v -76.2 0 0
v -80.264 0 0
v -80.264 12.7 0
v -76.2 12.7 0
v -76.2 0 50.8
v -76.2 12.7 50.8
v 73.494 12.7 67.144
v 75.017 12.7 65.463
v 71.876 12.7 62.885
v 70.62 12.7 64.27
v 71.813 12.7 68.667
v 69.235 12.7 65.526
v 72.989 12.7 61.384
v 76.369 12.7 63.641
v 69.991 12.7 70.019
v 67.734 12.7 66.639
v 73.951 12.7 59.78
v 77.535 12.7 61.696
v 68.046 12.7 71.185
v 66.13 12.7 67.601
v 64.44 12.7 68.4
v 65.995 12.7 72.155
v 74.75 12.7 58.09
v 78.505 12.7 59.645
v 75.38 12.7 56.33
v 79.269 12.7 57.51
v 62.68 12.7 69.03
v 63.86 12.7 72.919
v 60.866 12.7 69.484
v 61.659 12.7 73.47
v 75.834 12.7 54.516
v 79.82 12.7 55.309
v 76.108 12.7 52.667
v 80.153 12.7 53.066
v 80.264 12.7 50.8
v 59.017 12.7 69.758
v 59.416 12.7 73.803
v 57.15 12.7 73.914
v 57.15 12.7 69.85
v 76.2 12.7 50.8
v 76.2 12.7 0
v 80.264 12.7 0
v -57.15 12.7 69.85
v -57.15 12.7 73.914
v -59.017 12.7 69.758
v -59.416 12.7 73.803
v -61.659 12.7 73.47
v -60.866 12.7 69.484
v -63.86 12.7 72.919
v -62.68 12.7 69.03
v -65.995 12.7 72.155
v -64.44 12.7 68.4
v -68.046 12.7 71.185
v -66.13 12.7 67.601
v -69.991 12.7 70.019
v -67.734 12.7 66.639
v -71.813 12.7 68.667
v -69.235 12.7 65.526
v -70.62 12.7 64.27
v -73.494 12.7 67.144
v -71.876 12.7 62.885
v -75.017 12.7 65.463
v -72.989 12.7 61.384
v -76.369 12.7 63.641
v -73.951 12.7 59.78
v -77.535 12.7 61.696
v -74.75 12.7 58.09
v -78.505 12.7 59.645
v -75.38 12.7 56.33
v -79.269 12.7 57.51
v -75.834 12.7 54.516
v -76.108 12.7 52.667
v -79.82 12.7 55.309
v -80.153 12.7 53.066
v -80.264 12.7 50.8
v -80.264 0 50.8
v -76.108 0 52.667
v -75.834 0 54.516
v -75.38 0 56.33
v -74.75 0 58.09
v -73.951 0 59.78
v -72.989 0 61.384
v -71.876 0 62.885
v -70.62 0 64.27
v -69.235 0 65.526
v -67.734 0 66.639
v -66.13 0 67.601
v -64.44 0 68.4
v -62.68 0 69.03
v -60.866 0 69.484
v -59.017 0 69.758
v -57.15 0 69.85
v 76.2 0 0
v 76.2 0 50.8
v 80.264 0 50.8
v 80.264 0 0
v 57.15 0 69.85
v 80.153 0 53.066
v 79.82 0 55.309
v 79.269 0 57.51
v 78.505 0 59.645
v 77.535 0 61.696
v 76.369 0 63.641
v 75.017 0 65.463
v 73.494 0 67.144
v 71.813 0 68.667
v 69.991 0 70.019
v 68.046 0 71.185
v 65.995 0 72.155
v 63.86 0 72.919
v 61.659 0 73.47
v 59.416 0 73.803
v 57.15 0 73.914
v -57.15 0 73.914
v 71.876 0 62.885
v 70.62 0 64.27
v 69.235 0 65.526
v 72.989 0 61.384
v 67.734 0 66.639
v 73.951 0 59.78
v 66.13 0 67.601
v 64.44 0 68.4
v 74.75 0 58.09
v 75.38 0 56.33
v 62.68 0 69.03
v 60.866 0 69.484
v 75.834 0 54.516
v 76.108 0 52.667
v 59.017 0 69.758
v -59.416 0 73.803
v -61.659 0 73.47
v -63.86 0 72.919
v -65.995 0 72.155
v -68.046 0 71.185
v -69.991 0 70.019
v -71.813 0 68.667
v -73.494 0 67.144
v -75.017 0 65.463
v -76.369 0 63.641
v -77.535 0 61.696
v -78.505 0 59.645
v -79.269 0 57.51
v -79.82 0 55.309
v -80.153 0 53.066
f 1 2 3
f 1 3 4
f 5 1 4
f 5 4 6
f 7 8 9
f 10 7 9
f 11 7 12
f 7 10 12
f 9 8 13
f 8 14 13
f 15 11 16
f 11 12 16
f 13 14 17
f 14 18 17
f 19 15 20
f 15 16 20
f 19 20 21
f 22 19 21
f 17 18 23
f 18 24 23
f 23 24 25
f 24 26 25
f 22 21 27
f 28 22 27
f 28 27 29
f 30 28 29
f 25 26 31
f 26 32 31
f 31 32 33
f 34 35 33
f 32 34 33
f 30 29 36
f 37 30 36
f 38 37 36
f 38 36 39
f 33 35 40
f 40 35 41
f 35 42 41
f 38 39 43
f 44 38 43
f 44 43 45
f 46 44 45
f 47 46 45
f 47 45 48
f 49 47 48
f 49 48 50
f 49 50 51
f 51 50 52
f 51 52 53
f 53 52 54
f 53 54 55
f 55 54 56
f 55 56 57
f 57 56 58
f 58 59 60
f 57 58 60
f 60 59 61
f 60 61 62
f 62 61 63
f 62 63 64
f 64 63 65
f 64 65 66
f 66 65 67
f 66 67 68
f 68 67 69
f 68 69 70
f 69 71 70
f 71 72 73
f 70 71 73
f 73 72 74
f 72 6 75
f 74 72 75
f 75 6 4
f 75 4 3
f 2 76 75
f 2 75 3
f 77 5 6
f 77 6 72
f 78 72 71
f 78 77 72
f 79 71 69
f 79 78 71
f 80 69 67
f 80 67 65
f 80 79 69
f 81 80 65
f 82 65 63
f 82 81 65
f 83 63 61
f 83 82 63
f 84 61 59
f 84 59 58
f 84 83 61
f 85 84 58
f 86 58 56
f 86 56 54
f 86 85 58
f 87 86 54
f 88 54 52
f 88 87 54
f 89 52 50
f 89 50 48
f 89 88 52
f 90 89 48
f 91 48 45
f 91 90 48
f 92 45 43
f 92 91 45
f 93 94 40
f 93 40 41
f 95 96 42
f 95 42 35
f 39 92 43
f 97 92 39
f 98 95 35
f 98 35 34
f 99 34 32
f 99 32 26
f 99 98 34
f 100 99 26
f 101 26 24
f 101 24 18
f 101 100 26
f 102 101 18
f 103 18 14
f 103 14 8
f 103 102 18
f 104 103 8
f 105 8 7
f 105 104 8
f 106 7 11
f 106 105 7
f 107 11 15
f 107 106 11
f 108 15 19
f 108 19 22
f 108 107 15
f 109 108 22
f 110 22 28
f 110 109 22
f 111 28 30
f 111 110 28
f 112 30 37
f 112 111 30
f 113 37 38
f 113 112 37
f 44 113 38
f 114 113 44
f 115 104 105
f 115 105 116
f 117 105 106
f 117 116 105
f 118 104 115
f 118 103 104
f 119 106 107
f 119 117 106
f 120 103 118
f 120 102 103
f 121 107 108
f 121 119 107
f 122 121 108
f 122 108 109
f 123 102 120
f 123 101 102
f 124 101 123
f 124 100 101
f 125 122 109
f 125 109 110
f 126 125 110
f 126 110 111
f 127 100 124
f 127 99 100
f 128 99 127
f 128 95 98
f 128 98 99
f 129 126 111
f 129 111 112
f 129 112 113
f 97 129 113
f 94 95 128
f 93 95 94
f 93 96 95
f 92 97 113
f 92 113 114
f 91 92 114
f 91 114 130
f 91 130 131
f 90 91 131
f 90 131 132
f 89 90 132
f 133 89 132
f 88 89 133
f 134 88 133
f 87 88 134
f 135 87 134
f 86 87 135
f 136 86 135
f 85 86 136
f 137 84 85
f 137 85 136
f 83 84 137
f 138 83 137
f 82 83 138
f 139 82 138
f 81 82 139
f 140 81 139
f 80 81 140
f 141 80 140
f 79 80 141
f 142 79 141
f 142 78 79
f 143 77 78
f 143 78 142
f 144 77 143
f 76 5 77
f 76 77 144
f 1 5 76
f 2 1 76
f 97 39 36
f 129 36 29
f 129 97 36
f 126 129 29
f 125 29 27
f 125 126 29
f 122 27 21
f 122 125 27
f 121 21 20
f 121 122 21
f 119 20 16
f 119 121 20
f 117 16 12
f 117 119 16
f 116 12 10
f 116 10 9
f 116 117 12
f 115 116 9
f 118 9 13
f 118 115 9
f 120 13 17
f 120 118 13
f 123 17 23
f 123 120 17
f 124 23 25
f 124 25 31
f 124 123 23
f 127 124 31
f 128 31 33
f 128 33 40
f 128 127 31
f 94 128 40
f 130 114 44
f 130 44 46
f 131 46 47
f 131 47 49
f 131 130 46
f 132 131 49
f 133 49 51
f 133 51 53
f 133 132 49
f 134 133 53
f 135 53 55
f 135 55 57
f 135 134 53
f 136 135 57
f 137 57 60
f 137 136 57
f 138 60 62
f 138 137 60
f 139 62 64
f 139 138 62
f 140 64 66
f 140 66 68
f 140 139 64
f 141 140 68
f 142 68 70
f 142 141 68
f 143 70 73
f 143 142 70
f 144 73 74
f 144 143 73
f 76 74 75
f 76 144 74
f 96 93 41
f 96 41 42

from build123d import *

# Parameters (mm, degrees)
BOSS_EXTRUDE4_DEPTH = 12.7


with BuildPart() as part:
    # Sketch474 → Boss-Extrude4 (new body)
    with BuildSketch(Plane(origin=(0, 0, 0), x_dir=(1, 0, 0), z_dir=(0, 1, 0))):
        with BuildLine():
            Line((-76.2, 0), (-76.2, -50.8))
            ThreePointArc((-76.2, -50.8), (-70.620384182, -64.270384182), (-57.15, -69.85))
            Line((-57.15, -69.85), (57.15, -69.85))
            ThreePointArc((57.15, -69.85), (70.620384182, -64.270384182), (76.2, -50.8))
            Line((76.2, -50.8), (76.2, 0))
            Line((76.2, 0), (80.264, 0))
            Line((80.264, 0), (80.264, -50.8))
            ThreePointArc((80.264, -50.8), (73.49406614, -67.14406614), (57.15, -73.914))
            Line((57.15, -73.914), (-57.15, -73.914))
            ThreePointArc((-57.15, -73.914), (-73.49406614, -67.14406614), (-80.264, -50.8))
            Line((-80.264, -50.8), (-80.264, 0))
            Line((-80.264, 0), (-76.2, 0))
        make_face()
    extrude(amount=BOSS_EXTRUDE4_DEPTH)


solid = part.part
